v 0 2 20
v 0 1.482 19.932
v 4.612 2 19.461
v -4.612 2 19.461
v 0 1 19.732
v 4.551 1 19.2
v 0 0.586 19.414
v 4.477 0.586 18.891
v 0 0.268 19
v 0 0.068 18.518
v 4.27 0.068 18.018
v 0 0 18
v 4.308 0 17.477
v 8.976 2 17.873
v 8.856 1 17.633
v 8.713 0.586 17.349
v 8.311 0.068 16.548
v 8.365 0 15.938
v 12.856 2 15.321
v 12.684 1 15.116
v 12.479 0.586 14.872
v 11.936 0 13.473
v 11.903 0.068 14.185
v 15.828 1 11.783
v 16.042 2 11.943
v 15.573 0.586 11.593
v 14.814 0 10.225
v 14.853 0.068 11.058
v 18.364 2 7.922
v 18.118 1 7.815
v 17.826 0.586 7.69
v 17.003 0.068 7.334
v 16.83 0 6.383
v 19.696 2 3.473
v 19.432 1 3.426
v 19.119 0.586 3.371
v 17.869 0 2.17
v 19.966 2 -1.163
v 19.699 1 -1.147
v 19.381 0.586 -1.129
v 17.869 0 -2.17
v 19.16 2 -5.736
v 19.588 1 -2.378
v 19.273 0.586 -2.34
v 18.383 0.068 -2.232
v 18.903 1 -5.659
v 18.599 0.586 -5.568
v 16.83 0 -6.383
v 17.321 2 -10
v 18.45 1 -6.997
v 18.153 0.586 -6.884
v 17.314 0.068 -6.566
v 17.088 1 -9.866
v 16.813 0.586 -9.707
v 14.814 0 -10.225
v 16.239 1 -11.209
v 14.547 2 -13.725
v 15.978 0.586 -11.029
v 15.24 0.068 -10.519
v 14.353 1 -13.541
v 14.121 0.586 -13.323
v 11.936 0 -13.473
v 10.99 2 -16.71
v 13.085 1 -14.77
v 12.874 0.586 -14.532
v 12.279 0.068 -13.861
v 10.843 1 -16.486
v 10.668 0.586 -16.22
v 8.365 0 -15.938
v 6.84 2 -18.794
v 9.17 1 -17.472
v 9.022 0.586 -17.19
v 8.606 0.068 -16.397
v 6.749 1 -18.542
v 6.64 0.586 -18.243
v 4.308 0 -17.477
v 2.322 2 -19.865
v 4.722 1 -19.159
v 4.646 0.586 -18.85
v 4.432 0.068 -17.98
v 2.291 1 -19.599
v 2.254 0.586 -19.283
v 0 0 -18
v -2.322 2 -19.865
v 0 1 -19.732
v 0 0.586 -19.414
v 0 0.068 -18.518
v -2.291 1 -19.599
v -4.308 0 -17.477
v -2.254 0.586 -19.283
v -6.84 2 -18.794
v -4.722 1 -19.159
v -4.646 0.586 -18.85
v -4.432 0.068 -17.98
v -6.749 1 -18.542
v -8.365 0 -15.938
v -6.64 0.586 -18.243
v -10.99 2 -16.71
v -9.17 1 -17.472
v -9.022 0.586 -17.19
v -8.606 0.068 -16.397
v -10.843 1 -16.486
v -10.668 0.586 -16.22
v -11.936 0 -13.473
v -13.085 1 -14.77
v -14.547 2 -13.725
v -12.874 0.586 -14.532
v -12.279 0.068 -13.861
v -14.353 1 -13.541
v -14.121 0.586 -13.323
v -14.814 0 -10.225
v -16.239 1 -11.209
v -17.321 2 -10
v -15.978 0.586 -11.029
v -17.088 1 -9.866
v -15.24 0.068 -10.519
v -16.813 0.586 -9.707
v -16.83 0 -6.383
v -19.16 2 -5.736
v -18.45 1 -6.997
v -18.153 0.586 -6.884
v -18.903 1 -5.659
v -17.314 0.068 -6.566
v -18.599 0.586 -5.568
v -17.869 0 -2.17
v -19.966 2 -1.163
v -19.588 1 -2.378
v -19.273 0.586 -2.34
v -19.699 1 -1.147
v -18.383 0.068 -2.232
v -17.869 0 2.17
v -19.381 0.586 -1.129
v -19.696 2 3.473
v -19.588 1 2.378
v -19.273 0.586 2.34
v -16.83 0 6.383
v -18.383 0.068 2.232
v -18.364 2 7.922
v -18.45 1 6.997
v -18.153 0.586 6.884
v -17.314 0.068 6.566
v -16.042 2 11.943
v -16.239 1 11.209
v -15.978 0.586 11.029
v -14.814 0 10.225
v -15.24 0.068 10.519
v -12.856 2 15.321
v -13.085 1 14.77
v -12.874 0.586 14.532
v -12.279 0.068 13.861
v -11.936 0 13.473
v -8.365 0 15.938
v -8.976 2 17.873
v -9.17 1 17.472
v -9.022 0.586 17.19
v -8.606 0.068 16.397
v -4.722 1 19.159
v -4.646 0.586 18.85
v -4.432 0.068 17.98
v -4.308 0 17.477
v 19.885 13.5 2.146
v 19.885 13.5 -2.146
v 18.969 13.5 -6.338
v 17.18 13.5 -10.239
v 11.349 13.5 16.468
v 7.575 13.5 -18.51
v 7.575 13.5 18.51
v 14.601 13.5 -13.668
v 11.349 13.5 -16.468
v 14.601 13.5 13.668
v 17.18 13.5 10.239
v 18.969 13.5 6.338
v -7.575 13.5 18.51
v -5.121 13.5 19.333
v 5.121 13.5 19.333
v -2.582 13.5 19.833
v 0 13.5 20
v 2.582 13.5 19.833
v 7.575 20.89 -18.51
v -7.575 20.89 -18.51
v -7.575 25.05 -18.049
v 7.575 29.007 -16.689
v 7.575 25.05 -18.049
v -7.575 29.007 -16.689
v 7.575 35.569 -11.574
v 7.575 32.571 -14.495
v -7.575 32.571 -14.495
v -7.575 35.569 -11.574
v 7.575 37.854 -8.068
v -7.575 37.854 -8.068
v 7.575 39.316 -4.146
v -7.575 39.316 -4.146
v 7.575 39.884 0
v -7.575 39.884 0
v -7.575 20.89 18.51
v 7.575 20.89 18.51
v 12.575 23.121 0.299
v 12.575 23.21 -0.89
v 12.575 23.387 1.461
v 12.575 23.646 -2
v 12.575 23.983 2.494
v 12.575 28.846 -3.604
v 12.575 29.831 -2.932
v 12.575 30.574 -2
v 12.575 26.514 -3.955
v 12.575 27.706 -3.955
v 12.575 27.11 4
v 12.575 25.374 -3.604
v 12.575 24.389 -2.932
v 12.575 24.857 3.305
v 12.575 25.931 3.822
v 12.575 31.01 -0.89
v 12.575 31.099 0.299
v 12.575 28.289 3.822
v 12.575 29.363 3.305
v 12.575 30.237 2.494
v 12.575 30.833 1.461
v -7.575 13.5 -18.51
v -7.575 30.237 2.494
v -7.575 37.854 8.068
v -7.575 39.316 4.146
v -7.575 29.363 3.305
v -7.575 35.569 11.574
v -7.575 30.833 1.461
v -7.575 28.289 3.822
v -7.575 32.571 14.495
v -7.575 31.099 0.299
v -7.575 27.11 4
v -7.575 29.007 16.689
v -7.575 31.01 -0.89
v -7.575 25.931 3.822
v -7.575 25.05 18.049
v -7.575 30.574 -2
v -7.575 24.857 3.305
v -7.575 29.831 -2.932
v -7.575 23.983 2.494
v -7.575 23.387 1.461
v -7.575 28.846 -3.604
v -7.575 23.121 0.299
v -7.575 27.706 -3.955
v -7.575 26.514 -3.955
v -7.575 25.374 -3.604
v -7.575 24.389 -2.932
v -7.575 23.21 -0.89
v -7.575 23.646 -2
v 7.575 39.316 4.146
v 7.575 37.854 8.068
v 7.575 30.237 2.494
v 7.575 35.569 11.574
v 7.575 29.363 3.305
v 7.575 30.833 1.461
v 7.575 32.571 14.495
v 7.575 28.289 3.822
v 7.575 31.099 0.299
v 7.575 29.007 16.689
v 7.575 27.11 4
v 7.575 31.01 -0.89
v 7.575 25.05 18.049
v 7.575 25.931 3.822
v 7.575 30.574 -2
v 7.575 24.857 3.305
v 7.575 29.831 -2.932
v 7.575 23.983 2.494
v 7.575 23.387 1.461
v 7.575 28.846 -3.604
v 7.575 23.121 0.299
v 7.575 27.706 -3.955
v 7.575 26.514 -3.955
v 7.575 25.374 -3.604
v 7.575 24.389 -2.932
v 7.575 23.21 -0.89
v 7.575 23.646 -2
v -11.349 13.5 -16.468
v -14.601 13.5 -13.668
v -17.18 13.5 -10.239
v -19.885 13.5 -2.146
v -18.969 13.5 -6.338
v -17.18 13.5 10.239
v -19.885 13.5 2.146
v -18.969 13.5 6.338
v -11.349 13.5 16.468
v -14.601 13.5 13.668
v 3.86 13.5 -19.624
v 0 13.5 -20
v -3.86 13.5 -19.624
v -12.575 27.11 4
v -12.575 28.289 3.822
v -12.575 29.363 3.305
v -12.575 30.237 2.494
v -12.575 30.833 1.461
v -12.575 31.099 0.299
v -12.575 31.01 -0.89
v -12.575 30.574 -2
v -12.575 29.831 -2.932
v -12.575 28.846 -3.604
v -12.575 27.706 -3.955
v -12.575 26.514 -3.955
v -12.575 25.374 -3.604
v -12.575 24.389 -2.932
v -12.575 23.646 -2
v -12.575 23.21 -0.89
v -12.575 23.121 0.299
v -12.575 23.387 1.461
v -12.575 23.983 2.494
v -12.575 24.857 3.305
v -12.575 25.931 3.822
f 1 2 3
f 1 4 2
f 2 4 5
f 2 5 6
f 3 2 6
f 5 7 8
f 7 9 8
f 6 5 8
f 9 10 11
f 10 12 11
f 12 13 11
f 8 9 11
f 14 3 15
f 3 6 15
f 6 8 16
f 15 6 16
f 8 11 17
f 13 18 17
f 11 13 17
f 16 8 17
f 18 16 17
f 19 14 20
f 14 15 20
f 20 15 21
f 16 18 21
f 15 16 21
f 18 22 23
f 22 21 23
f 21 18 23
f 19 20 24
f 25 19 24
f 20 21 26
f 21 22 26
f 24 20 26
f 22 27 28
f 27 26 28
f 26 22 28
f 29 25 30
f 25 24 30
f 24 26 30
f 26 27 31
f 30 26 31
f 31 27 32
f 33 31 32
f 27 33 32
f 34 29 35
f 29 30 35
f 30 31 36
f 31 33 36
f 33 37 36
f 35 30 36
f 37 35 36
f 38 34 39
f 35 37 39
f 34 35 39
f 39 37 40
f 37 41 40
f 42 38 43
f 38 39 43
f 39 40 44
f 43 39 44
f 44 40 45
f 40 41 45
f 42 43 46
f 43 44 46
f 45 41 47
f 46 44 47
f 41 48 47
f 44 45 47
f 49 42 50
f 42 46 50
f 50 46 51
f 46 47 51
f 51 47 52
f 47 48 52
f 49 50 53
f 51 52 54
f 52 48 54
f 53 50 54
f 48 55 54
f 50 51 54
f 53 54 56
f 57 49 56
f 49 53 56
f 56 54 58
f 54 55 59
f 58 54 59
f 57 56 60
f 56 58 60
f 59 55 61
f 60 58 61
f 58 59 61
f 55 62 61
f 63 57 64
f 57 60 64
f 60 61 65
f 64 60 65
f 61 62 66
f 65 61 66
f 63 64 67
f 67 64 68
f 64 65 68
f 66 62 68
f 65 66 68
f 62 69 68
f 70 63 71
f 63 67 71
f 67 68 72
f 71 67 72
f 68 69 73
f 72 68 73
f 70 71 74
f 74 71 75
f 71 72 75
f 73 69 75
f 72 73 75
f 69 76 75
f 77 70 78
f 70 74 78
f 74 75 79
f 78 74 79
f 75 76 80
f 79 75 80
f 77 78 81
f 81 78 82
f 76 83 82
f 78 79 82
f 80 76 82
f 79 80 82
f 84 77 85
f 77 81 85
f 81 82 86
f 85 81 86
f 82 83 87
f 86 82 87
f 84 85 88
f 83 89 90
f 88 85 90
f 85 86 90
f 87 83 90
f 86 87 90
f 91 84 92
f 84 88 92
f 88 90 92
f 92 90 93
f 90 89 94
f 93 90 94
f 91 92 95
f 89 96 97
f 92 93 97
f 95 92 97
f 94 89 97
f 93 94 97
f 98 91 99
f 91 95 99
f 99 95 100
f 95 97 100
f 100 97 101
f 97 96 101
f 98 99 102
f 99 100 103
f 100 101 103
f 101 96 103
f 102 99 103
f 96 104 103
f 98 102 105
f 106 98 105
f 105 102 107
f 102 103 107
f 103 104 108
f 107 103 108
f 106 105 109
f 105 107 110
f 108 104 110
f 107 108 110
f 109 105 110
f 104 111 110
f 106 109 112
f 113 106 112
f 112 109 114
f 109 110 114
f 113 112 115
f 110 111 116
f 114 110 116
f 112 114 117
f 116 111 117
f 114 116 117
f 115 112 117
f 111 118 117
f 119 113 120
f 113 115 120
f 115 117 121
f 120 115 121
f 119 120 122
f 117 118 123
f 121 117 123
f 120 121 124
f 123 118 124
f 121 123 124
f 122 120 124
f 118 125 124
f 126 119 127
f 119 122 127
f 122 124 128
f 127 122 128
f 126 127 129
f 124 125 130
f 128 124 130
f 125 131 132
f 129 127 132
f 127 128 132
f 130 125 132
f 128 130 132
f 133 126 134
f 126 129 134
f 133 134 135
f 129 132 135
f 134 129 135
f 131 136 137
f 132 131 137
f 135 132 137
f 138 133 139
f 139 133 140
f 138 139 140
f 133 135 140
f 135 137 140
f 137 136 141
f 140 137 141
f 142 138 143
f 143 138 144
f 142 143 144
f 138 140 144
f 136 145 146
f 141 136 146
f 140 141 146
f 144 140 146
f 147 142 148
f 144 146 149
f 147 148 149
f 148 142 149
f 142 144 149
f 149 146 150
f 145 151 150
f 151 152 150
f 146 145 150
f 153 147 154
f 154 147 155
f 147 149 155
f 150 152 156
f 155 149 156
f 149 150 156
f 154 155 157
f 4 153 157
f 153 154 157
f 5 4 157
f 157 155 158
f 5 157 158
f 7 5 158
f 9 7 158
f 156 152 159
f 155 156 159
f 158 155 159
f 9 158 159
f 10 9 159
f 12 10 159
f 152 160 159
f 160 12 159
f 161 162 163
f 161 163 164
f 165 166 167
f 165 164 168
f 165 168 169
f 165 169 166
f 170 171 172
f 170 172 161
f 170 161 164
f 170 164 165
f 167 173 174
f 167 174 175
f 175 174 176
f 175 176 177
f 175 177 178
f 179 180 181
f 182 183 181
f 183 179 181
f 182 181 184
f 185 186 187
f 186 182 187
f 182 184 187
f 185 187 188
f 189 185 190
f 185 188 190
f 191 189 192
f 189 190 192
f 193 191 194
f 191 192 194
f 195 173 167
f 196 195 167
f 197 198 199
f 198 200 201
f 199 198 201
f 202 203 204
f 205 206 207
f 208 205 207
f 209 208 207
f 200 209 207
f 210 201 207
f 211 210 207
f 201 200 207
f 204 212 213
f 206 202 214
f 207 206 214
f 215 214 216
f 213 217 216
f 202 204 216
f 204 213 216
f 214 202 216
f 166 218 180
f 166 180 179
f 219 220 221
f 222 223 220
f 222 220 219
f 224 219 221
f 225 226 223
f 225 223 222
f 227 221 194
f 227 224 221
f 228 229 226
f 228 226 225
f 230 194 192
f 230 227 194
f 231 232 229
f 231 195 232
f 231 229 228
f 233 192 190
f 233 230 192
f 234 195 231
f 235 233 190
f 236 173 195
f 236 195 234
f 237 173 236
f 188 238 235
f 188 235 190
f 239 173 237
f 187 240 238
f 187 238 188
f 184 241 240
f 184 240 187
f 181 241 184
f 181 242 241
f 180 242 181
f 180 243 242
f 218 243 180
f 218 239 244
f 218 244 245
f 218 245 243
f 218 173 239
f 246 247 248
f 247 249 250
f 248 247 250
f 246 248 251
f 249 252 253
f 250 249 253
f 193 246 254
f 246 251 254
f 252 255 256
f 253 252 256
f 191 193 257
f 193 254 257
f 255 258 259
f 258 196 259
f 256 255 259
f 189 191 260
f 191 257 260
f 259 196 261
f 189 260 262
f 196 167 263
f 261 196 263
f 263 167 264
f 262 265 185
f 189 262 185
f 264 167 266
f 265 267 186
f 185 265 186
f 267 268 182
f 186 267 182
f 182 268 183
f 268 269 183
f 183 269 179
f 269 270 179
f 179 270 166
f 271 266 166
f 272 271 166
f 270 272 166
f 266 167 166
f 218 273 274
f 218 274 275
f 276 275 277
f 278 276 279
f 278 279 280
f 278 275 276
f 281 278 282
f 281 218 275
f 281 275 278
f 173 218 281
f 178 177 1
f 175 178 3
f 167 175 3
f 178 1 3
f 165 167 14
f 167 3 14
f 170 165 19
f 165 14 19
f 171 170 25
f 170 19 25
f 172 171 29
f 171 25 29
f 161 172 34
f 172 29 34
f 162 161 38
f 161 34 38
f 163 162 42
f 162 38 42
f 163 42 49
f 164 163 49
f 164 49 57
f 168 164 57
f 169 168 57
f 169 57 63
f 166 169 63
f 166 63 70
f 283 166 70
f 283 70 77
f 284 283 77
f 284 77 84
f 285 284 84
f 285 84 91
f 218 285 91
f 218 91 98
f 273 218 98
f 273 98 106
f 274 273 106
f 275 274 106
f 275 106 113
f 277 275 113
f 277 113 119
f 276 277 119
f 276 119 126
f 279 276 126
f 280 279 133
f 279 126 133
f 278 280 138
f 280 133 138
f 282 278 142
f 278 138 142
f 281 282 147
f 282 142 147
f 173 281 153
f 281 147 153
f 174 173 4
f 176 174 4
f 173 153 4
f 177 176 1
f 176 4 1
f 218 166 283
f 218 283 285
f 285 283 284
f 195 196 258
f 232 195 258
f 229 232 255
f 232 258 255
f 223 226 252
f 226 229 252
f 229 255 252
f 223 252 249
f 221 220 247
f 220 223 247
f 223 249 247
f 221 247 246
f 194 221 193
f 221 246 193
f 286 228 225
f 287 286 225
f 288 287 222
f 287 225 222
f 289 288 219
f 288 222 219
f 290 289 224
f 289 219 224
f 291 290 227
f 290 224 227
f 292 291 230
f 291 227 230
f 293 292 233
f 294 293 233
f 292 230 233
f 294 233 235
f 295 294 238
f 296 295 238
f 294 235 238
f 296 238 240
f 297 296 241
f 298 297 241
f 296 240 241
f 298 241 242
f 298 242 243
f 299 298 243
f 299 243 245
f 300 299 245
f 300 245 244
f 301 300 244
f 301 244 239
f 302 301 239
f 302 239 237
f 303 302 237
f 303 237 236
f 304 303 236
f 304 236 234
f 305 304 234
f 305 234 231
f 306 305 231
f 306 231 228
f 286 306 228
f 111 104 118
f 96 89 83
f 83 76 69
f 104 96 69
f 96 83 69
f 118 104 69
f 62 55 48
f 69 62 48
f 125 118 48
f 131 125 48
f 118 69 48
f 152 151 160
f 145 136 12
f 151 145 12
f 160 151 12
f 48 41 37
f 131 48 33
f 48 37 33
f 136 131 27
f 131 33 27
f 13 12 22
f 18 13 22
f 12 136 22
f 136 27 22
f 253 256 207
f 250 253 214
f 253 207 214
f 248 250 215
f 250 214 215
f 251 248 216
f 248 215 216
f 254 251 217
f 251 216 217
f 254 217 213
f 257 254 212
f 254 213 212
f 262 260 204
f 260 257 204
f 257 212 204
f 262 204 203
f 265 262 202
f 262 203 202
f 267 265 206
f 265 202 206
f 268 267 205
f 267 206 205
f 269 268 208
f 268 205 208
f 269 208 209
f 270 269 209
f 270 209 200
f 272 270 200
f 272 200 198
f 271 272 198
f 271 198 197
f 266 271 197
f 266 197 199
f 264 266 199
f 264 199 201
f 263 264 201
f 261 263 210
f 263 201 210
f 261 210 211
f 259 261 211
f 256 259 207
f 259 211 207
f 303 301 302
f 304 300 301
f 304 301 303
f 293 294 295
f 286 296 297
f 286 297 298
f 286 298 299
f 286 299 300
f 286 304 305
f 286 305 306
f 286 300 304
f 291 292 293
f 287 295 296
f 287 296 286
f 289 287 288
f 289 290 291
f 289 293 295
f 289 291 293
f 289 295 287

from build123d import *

# Parameters (mm, degrees)
CROQUIS1_R                   = 20
SALIENTE_EXTRUIR1_DEPTH      = 13.5
REDONDEO1_R                  = 2
CROQUIS2_W                   = 15.149467894
CROQUIS2_H                   = 37.020178586
SALIENTE_EXTRUIR2_DEPTH      = 26.39
SALIENTE_EXTRUIR3_DEPTH      = 5
SALIENTE_EXTRUIR3_DEPTH_BACK = 20.15
CROQUIS3_R                   = 4
REDONDEO2_R                  = 19


with BuildPart() as part:
    # Croquis1 → Saliente-Extruir1 (new body)
    with BuildSketch(Plane(origin=(0, 0, 0), x_dir=(1, 0, 0), z_dir=(0, 1, 0))):
        with Locations(Location((0, 0, 0), (0, 0, 270))):
            Circle(CROQUIS1_R)
    extrude(amount=SALIENTE_EXTRUIR1_DEPTH)

    # Redondeo1
    redondeo1_edges = [part.edges().sort_by_distance(p)[0] for p in [
        (0, 0, -20),
    ]]
    fillet(redondeo1_edges, radius=REDONDEO1_R)

    # Croquis2 → Saliente-Extruir2 (add)
    with BuildSketch(Plane(origin=(0, 13.5, 0), x_dir=(1, 0, 0), z_dir=(0, 1, 0))):
        Rectangle(CROQUIS2_W, CROQUIS2_H)
    extrude(amount=SALIENTE_EXTRUIR2_DEPTH)

    # Croquis3 → Saliente-Extruir3 (add, two sides: drawn at the far end of the back side and taken through both)
    with BuildSketch(Plane.ZY.offset(7.574733947).offset(-SALIENTE_EXTRUIR3_DEPTH_BACK)):
        with Locations((0, 27.11)):
            Circle(CROQUIS3_R)
    extrude(amount=SALIENTE_EXTRUIR3_DEPTH + SALIENTE_EXTRUIR3_DEPTH_BACK)

    # Redondeo2
    # the kernel refuses this fillet: 19 mm, written as the material it takes off along each edge
    with BuildSketch(Plane(origin=(55.074733947, 39.89, 18.510089293), x_dir=(0, -1, 0), z_dir=(-1, 0, 0)), Plane(origin=(-55.074733947, 39.89, -18.510089293), x_dir=(0, -1, 0), z_dir=(1, 0, 0))) as redondeo2_piece_1:
        with BuildLine():
            CenterArc((REDONDEO2_R, -REDONDEO2_R), REDONDEO2_R, 90, 90)
            Line((0, -REDONDEO2_R), (0, 0))
            Line((0, 0), (REDONDEO2_R, 0))
        make_face()
    extrude(amount=110.149467894, mode=Mode.SUBTRACT)


solid = part.part
